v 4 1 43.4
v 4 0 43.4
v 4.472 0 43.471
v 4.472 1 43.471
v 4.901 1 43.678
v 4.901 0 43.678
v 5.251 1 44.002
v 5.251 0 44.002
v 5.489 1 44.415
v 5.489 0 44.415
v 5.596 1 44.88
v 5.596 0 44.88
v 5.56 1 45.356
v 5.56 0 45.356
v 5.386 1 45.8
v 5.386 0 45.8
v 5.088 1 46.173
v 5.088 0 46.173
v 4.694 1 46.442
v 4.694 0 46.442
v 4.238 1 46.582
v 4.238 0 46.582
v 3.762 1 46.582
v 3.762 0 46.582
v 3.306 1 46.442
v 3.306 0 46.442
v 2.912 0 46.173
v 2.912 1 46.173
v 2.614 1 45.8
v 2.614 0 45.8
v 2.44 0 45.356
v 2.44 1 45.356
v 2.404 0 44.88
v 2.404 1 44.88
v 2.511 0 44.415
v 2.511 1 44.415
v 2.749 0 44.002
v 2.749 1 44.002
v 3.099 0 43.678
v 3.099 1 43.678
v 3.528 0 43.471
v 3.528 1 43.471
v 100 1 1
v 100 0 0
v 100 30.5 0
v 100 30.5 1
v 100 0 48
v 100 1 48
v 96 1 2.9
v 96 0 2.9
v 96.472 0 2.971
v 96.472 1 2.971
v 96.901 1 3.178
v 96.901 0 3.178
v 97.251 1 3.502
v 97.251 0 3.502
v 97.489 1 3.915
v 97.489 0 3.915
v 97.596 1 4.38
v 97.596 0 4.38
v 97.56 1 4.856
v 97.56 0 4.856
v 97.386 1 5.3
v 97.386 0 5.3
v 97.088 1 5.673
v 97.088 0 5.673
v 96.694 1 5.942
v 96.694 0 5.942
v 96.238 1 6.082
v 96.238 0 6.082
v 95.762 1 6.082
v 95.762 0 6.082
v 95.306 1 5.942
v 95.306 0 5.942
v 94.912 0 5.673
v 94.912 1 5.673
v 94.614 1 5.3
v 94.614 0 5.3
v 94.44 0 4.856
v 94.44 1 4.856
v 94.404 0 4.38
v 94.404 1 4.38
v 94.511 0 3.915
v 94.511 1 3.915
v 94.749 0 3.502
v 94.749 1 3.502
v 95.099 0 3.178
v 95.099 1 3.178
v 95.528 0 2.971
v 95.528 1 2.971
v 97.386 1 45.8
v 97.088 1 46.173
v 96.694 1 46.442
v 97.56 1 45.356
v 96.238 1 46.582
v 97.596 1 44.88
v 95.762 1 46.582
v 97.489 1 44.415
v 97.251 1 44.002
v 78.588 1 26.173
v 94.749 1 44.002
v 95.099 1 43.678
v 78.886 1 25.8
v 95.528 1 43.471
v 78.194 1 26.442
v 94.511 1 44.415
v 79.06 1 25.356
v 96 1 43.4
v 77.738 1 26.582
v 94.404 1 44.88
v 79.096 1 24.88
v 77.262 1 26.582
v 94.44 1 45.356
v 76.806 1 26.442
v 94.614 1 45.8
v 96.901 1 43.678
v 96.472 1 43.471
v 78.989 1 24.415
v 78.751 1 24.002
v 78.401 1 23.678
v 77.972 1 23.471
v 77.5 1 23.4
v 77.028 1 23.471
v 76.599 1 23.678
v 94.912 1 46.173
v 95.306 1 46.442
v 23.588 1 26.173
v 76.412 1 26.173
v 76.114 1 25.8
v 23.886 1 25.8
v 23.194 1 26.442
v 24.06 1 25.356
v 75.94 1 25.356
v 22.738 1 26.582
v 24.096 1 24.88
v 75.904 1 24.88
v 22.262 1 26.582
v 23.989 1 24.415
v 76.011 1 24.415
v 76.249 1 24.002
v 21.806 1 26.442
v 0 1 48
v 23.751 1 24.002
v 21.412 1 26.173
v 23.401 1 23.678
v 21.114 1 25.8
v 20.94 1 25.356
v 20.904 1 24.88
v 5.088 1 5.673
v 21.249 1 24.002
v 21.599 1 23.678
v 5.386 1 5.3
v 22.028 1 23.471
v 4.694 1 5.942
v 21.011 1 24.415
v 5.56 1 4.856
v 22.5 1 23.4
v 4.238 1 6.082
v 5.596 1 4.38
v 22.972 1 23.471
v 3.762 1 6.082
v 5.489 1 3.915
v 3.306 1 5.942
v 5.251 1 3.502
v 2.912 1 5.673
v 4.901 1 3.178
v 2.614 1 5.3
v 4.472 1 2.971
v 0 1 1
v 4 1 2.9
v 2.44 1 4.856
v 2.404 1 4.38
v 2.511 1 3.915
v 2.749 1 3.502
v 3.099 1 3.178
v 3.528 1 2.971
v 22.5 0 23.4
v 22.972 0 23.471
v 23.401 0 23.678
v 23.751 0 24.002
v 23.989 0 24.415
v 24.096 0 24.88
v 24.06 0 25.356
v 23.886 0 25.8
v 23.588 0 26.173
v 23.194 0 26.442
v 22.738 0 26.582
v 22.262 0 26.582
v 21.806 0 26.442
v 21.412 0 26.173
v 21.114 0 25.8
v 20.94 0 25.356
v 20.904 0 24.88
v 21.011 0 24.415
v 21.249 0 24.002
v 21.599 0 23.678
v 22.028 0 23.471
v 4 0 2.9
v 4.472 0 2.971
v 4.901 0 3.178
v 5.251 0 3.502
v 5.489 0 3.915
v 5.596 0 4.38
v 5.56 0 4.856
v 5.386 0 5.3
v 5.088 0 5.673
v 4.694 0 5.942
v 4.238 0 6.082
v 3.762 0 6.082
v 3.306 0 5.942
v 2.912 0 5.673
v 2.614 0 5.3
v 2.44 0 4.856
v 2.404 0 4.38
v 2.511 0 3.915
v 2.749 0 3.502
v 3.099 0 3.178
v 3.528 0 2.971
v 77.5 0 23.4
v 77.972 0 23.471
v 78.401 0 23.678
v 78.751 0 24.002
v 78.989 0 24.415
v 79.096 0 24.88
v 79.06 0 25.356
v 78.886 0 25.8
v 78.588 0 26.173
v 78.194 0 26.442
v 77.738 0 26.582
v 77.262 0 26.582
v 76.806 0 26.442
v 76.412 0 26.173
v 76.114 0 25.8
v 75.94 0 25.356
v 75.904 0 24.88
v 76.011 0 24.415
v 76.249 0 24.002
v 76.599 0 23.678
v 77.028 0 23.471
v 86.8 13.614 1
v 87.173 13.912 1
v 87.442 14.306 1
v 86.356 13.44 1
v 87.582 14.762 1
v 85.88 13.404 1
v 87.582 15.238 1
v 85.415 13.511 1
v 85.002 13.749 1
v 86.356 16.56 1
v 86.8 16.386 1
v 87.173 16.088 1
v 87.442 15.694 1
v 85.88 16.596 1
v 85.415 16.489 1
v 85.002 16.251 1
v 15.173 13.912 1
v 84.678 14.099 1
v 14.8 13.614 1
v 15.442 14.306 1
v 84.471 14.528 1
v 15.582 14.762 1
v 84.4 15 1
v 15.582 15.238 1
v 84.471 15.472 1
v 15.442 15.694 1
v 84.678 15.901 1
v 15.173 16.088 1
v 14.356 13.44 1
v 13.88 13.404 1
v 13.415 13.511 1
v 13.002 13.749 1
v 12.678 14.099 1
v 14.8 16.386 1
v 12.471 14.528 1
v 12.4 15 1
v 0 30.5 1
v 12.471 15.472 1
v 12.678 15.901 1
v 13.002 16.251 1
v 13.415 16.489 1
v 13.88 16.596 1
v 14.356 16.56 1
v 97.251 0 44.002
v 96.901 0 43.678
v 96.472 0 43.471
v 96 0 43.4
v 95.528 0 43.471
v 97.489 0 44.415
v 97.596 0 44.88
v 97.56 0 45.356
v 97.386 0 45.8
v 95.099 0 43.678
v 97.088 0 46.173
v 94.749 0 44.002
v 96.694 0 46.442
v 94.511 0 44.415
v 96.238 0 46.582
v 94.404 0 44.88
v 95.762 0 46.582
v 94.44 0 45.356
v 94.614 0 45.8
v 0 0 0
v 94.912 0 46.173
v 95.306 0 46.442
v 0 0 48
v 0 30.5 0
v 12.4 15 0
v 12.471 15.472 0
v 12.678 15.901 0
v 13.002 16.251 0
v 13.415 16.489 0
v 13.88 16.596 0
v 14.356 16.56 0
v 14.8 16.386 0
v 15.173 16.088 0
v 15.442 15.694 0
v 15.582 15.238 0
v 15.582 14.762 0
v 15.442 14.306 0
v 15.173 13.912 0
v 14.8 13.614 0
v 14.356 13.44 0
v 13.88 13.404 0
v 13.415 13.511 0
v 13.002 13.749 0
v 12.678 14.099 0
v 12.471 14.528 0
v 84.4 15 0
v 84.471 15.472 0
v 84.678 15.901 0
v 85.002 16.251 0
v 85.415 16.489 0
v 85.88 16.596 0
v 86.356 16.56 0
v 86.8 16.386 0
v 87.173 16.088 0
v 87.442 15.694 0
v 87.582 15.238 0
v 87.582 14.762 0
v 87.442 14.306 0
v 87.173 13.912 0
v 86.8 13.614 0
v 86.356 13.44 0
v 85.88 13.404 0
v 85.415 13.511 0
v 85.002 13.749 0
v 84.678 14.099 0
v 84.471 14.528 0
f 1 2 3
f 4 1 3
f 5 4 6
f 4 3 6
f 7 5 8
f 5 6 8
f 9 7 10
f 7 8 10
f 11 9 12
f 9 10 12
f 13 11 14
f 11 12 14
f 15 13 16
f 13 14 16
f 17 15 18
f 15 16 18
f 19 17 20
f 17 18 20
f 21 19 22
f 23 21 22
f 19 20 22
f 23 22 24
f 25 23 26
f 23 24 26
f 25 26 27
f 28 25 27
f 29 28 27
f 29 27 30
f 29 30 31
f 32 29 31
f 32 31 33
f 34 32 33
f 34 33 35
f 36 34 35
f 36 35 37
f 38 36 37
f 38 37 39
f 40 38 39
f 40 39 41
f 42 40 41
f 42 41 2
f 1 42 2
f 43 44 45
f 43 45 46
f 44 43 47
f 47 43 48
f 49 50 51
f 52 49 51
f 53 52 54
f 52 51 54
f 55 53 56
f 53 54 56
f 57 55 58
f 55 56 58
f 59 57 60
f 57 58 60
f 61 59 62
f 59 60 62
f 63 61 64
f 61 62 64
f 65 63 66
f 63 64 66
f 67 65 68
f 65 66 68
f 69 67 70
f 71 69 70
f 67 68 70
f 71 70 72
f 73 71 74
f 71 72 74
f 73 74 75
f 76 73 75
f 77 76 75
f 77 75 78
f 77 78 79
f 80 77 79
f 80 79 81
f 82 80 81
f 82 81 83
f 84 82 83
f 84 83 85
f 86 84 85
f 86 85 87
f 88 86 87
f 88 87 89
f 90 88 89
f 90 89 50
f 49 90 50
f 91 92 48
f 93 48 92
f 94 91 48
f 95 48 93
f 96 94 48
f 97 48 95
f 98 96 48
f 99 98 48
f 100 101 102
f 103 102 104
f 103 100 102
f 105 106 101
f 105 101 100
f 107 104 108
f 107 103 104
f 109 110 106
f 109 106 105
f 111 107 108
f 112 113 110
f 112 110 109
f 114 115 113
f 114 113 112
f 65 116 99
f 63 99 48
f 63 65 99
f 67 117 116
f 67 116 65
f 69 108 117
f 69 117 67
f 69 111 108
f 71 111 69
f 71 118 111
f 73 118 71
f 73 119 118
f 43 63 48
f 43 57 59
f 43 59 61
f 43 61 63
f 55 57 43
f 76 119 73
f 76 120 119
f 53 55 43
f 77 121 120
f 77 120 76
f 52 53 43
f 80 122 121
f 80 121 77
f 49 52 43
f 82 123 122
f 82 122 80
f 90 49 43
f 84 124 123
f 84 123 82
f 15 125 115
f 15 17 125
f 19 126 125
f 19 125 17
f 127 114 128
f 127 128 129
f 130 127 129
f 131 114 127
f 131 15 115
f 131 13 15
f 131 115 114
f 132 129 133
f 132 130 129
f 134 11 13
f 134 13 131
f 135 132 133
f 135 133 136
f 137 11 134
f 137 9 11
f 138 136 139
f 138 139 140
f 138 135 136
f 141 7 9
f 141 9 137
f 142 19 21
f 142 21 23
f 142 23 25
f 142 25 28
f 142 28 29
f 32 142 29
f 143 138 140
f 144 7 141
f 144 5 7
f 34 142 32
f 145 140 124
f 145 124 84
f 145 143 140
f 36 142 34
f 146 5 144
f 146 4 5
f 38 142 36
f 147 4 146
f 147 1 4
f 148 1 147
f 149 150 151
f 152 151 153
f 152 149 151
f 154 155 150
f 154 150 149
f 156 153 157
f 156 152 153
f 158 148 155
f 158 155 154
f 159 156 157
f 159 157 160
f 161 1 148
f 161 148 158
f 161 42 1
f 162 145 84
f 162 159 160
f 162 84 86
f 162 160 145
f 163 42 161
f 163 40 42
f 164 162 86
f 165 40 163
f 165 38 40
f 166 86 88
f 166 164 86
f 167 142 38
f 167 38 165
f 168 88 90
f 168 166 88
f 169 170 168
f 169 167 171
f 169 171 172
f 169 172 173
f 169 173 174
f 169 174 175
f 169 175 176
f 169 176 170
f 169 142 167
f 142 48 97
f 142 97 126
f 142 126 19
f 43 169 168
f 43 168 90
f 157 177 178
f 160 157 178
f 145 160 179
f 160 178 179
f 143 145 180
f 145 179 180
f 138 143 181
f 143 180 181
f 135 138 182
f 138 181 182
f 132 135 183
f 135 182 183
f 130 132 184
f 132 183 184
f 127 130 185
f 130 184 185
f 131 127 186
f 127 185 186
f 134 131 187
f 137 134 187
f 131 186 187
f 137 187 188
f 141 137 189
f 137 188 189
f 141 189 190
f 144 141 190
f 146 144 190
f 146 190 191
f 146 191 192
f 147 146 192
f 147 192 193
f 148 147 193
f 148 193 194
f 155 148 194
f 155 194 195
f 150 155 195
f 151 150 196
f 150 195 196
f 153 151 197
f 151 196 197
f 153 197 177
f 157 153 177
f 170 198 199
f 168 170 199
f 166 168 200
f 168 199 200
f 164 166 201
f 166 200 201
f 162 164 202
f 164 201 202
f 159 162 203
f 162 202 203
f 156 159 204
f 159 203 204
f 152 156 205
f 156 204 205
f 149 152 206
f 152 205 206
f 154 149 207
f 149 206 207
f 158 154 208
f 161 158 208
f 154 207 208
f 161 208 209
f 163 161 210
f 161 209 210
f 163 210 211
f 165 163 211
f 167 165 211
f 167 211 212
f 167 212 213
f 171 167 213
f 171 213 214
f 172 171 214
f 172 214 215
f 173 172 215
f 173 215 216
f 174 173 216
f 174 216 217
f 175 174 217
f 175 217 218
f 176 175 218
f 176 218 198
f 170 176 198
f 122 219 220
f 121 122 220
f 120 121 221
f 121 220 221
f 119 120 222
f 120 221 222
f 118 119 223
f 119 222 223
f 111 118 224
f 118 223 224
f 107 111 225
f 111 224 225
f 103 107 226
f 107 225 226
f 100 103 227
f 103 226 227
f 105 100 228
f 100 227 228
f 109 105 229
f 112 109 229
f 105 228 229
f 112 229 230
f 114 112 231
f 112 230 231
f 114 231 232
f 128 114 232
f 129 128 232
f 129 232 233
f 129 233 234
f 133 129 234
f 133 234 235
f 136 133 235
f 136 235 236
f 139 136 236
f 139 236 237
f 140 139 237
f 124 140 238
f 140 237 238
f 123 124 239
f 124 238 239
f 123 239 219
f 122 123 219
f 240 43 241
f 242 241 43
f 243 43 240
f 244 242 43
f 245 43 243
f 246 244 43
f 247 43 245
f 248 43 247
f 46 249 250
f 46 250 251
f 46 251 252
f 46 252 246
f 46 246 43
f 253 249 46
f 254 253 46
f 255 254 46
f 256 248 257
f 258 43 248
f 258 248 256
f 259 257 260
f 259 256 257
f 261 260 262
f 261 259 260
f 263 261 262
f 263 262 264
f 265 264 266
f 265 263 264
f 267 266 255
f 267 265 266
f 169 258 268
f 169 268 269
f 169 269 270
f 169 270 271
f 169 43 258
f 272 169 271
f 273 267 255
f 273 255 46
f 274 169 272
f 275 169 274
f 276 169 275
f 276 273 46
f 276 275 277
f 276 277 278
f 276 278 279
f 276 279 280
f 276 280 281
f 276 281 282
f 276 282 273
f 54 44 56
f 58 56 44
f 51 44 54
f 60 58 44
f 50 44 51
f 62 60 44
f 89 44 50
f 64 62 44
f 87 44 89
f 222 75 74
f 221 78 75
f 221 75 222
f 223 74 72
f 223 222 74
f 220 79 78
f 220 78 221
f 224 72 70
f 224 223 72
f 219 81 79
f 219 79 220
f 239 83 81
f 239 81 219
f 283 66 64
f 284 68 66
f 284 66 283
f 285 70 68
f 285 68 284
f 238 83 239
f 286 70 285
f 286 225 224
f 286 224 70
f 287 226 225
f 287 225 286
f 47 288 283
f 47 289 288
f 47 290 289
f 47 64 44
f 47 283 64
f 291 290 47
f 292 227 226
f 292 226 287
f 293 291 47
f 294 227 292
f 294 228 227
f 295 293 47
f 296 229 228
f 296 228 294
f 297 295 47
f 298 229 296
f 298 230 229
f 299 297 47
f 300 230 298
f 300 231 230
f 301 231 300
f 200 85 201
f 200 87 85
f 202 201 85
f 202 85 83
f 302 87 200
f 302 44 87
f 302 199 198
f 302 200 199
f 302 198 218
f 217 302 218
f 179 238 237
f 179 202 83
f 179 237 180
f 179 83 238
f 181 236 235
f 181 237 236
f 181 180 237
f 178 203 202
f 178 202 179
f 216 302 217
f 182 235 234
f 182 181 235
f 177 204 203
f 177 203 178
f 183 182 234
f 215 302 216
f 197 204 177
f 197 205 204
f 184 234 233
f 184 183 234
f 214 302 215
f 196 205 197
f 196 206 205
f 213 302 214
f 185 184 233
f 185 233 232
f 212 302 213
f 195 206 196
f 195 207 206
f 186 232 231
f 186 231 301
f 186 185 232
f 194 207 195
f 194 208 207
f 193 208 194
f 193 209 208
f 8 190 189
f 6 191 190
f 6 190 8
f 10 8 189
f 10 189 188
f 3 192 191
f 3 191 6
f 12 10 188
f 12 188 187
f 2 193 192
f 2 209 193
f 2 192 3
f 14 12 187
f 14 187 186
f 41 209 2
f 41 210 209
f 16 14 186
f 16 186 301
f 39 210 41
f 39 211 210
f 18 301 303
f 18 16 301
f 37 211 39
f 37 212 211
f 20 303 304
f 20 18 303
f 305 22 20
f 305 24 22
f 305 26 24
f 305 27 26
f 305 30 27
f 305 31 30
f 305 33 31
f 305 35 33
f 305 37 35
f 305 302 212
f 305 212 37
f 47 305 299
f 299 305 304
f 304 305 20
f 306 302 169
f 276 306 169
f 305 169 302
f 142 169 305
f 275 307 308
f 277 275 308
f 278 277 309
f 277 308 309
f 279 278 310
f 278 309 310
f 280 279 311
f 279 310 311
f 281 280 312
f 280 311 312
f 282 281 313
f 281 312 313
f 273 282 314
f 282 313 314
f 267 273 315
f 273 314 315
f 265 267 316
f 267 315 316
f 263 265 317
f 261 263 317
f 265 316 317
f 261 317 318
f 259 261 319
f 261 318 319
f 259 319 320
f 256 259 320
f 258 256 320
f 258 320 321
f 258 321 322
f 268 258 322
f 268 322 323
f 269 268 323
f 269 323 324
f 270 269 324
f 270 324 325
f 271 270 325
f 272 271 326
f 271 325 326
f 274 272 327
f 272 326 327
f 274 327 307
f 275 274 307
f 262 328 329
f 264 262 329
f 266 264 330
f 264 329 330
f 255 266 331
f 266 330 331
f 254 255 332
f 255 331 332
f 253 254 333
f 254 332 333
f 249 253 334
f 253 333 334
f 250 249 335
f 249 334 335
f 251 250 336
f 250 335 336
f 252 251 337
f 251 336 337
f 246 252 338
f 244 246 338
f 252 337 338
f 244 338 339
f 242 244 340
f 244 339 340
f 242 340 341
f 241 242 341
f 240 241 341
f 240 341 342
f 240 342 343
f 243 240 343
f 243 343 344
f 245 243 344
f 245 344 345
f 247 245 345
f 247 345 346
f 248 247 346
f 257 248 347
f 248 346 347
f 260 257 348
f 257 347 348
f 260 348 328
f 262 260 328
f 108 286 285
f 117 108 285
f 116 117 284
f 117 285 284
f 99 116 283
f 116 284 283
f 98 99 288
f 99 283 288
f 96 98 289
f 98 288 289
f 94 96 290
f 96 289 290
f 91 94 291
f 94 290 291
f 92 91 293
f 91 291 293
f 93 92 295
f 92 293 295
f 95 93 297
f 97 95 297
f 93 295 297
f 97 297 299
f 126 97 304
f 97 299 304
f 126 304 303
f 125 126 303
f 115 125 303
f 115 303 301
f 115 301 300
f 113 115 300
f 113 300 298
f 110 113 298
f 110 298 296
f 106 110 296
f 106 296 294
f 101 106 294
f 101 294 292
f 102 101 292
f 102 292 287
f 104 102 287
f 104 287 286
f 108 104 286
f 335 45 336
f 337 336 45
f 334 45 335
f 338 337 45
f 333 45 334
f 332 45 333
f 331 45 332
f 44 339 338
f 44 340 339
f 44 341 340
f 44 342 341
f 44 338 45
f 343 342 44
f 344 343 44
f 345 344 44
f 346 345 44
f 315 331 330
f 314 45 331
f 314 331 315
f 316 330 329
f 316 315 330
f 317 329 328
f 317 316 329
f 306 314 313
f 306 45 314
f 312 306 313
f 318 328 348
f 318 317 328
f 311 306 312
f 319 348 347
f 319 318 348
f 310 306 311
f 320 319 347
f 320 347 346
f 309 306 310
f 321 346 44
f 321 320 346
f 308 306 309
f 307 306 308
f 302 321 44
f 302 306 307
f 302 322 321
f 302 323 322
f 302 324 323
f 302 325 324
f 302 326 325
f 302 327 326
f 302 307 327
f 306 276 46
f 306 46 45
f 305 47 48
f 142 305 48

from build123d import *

# Parameters (mm, degrees)
EXTRUDE_1_DEPTH     = 100
SKETCH_2_R          = 1.6
CUT_EXTRUDE_1_DEPTH = 1
SKETCH_3_R          = 1.6
CUT_EXTRUDE_2_DEPTH = 1
SKETCH1_R           = 1.6
CUT_EXTRUDE1_DEPTH  = 10


with BuildPart() as part:
    # Эскиз1 → Бобышка-Вытянуть1 (new body)
    with BuildSketch(Plane(origin=(0, 0, 0), x_dir=(0, 0, -1), z_dir=(1, 0, 0))):
        Polygon((0, 0), (-48, 0), (-48, 1), (-1, 1), (-1, 30.5), (0, 30.5), align=None)
    extrude(amount=EXTRUDE_1_DEPTH)

    # Эскиз2 → Вырез-Вытянуть1 (cut)
    with BuildSketch(Plane(origin=(0, 0, 0), x_dir=(-1, 0, 0), z_dir=(0, 0, -1))):
        with Locations((-86, 15)):
            Circle(SKETCH_2_R)
        with Locations((-14, 15)):
            Circle(SKETCH_2_R)
    extrude(amount=-CUT_EXTRUDE_1_DEPTH, mode=Mode.SUBTRACT)

    # Эскиз3 → Вырез-Вытянуть2 (cut)
    with BuildSketch(Plane.XZ):
        with Locations(Location((22.5, 25, 0), (0, 0, 270))):
            Circle(SKETCH_3_R)
        with Locations(Location((77.5, 25, 0), (0, 0, 270))):
            Circle(SKETCH_3_R)
    extrude(amount=-CUT_EXTRUDE_2_DEPTH, mode=Mode.SUBTRACT)

    # Sketch1 → Cut-Extrude1 (cut)
    with BuildSketch(Plane.XZ):
        with Locations(Location((4, 45, 0), (0, 0, 270))):
            Circle(SKETCH1_R)
        with Locations(Location((96, 45, 0), (0, 0, 270))):
            Circle(SKETCH1_R)
        with Locations(Location((96, 4.5, 0), (0, 0, 270))):
            Circle(SKETCH1_R)
        with Locations(Location((4, 4.5, 0), (0, 0, 270))):
            Circle(SKETCH1_R)
    extrude(amount=-CUT_EXTRUDE1_DEPTH, mode=Mode.SUBTRACT)


solid = part.part
